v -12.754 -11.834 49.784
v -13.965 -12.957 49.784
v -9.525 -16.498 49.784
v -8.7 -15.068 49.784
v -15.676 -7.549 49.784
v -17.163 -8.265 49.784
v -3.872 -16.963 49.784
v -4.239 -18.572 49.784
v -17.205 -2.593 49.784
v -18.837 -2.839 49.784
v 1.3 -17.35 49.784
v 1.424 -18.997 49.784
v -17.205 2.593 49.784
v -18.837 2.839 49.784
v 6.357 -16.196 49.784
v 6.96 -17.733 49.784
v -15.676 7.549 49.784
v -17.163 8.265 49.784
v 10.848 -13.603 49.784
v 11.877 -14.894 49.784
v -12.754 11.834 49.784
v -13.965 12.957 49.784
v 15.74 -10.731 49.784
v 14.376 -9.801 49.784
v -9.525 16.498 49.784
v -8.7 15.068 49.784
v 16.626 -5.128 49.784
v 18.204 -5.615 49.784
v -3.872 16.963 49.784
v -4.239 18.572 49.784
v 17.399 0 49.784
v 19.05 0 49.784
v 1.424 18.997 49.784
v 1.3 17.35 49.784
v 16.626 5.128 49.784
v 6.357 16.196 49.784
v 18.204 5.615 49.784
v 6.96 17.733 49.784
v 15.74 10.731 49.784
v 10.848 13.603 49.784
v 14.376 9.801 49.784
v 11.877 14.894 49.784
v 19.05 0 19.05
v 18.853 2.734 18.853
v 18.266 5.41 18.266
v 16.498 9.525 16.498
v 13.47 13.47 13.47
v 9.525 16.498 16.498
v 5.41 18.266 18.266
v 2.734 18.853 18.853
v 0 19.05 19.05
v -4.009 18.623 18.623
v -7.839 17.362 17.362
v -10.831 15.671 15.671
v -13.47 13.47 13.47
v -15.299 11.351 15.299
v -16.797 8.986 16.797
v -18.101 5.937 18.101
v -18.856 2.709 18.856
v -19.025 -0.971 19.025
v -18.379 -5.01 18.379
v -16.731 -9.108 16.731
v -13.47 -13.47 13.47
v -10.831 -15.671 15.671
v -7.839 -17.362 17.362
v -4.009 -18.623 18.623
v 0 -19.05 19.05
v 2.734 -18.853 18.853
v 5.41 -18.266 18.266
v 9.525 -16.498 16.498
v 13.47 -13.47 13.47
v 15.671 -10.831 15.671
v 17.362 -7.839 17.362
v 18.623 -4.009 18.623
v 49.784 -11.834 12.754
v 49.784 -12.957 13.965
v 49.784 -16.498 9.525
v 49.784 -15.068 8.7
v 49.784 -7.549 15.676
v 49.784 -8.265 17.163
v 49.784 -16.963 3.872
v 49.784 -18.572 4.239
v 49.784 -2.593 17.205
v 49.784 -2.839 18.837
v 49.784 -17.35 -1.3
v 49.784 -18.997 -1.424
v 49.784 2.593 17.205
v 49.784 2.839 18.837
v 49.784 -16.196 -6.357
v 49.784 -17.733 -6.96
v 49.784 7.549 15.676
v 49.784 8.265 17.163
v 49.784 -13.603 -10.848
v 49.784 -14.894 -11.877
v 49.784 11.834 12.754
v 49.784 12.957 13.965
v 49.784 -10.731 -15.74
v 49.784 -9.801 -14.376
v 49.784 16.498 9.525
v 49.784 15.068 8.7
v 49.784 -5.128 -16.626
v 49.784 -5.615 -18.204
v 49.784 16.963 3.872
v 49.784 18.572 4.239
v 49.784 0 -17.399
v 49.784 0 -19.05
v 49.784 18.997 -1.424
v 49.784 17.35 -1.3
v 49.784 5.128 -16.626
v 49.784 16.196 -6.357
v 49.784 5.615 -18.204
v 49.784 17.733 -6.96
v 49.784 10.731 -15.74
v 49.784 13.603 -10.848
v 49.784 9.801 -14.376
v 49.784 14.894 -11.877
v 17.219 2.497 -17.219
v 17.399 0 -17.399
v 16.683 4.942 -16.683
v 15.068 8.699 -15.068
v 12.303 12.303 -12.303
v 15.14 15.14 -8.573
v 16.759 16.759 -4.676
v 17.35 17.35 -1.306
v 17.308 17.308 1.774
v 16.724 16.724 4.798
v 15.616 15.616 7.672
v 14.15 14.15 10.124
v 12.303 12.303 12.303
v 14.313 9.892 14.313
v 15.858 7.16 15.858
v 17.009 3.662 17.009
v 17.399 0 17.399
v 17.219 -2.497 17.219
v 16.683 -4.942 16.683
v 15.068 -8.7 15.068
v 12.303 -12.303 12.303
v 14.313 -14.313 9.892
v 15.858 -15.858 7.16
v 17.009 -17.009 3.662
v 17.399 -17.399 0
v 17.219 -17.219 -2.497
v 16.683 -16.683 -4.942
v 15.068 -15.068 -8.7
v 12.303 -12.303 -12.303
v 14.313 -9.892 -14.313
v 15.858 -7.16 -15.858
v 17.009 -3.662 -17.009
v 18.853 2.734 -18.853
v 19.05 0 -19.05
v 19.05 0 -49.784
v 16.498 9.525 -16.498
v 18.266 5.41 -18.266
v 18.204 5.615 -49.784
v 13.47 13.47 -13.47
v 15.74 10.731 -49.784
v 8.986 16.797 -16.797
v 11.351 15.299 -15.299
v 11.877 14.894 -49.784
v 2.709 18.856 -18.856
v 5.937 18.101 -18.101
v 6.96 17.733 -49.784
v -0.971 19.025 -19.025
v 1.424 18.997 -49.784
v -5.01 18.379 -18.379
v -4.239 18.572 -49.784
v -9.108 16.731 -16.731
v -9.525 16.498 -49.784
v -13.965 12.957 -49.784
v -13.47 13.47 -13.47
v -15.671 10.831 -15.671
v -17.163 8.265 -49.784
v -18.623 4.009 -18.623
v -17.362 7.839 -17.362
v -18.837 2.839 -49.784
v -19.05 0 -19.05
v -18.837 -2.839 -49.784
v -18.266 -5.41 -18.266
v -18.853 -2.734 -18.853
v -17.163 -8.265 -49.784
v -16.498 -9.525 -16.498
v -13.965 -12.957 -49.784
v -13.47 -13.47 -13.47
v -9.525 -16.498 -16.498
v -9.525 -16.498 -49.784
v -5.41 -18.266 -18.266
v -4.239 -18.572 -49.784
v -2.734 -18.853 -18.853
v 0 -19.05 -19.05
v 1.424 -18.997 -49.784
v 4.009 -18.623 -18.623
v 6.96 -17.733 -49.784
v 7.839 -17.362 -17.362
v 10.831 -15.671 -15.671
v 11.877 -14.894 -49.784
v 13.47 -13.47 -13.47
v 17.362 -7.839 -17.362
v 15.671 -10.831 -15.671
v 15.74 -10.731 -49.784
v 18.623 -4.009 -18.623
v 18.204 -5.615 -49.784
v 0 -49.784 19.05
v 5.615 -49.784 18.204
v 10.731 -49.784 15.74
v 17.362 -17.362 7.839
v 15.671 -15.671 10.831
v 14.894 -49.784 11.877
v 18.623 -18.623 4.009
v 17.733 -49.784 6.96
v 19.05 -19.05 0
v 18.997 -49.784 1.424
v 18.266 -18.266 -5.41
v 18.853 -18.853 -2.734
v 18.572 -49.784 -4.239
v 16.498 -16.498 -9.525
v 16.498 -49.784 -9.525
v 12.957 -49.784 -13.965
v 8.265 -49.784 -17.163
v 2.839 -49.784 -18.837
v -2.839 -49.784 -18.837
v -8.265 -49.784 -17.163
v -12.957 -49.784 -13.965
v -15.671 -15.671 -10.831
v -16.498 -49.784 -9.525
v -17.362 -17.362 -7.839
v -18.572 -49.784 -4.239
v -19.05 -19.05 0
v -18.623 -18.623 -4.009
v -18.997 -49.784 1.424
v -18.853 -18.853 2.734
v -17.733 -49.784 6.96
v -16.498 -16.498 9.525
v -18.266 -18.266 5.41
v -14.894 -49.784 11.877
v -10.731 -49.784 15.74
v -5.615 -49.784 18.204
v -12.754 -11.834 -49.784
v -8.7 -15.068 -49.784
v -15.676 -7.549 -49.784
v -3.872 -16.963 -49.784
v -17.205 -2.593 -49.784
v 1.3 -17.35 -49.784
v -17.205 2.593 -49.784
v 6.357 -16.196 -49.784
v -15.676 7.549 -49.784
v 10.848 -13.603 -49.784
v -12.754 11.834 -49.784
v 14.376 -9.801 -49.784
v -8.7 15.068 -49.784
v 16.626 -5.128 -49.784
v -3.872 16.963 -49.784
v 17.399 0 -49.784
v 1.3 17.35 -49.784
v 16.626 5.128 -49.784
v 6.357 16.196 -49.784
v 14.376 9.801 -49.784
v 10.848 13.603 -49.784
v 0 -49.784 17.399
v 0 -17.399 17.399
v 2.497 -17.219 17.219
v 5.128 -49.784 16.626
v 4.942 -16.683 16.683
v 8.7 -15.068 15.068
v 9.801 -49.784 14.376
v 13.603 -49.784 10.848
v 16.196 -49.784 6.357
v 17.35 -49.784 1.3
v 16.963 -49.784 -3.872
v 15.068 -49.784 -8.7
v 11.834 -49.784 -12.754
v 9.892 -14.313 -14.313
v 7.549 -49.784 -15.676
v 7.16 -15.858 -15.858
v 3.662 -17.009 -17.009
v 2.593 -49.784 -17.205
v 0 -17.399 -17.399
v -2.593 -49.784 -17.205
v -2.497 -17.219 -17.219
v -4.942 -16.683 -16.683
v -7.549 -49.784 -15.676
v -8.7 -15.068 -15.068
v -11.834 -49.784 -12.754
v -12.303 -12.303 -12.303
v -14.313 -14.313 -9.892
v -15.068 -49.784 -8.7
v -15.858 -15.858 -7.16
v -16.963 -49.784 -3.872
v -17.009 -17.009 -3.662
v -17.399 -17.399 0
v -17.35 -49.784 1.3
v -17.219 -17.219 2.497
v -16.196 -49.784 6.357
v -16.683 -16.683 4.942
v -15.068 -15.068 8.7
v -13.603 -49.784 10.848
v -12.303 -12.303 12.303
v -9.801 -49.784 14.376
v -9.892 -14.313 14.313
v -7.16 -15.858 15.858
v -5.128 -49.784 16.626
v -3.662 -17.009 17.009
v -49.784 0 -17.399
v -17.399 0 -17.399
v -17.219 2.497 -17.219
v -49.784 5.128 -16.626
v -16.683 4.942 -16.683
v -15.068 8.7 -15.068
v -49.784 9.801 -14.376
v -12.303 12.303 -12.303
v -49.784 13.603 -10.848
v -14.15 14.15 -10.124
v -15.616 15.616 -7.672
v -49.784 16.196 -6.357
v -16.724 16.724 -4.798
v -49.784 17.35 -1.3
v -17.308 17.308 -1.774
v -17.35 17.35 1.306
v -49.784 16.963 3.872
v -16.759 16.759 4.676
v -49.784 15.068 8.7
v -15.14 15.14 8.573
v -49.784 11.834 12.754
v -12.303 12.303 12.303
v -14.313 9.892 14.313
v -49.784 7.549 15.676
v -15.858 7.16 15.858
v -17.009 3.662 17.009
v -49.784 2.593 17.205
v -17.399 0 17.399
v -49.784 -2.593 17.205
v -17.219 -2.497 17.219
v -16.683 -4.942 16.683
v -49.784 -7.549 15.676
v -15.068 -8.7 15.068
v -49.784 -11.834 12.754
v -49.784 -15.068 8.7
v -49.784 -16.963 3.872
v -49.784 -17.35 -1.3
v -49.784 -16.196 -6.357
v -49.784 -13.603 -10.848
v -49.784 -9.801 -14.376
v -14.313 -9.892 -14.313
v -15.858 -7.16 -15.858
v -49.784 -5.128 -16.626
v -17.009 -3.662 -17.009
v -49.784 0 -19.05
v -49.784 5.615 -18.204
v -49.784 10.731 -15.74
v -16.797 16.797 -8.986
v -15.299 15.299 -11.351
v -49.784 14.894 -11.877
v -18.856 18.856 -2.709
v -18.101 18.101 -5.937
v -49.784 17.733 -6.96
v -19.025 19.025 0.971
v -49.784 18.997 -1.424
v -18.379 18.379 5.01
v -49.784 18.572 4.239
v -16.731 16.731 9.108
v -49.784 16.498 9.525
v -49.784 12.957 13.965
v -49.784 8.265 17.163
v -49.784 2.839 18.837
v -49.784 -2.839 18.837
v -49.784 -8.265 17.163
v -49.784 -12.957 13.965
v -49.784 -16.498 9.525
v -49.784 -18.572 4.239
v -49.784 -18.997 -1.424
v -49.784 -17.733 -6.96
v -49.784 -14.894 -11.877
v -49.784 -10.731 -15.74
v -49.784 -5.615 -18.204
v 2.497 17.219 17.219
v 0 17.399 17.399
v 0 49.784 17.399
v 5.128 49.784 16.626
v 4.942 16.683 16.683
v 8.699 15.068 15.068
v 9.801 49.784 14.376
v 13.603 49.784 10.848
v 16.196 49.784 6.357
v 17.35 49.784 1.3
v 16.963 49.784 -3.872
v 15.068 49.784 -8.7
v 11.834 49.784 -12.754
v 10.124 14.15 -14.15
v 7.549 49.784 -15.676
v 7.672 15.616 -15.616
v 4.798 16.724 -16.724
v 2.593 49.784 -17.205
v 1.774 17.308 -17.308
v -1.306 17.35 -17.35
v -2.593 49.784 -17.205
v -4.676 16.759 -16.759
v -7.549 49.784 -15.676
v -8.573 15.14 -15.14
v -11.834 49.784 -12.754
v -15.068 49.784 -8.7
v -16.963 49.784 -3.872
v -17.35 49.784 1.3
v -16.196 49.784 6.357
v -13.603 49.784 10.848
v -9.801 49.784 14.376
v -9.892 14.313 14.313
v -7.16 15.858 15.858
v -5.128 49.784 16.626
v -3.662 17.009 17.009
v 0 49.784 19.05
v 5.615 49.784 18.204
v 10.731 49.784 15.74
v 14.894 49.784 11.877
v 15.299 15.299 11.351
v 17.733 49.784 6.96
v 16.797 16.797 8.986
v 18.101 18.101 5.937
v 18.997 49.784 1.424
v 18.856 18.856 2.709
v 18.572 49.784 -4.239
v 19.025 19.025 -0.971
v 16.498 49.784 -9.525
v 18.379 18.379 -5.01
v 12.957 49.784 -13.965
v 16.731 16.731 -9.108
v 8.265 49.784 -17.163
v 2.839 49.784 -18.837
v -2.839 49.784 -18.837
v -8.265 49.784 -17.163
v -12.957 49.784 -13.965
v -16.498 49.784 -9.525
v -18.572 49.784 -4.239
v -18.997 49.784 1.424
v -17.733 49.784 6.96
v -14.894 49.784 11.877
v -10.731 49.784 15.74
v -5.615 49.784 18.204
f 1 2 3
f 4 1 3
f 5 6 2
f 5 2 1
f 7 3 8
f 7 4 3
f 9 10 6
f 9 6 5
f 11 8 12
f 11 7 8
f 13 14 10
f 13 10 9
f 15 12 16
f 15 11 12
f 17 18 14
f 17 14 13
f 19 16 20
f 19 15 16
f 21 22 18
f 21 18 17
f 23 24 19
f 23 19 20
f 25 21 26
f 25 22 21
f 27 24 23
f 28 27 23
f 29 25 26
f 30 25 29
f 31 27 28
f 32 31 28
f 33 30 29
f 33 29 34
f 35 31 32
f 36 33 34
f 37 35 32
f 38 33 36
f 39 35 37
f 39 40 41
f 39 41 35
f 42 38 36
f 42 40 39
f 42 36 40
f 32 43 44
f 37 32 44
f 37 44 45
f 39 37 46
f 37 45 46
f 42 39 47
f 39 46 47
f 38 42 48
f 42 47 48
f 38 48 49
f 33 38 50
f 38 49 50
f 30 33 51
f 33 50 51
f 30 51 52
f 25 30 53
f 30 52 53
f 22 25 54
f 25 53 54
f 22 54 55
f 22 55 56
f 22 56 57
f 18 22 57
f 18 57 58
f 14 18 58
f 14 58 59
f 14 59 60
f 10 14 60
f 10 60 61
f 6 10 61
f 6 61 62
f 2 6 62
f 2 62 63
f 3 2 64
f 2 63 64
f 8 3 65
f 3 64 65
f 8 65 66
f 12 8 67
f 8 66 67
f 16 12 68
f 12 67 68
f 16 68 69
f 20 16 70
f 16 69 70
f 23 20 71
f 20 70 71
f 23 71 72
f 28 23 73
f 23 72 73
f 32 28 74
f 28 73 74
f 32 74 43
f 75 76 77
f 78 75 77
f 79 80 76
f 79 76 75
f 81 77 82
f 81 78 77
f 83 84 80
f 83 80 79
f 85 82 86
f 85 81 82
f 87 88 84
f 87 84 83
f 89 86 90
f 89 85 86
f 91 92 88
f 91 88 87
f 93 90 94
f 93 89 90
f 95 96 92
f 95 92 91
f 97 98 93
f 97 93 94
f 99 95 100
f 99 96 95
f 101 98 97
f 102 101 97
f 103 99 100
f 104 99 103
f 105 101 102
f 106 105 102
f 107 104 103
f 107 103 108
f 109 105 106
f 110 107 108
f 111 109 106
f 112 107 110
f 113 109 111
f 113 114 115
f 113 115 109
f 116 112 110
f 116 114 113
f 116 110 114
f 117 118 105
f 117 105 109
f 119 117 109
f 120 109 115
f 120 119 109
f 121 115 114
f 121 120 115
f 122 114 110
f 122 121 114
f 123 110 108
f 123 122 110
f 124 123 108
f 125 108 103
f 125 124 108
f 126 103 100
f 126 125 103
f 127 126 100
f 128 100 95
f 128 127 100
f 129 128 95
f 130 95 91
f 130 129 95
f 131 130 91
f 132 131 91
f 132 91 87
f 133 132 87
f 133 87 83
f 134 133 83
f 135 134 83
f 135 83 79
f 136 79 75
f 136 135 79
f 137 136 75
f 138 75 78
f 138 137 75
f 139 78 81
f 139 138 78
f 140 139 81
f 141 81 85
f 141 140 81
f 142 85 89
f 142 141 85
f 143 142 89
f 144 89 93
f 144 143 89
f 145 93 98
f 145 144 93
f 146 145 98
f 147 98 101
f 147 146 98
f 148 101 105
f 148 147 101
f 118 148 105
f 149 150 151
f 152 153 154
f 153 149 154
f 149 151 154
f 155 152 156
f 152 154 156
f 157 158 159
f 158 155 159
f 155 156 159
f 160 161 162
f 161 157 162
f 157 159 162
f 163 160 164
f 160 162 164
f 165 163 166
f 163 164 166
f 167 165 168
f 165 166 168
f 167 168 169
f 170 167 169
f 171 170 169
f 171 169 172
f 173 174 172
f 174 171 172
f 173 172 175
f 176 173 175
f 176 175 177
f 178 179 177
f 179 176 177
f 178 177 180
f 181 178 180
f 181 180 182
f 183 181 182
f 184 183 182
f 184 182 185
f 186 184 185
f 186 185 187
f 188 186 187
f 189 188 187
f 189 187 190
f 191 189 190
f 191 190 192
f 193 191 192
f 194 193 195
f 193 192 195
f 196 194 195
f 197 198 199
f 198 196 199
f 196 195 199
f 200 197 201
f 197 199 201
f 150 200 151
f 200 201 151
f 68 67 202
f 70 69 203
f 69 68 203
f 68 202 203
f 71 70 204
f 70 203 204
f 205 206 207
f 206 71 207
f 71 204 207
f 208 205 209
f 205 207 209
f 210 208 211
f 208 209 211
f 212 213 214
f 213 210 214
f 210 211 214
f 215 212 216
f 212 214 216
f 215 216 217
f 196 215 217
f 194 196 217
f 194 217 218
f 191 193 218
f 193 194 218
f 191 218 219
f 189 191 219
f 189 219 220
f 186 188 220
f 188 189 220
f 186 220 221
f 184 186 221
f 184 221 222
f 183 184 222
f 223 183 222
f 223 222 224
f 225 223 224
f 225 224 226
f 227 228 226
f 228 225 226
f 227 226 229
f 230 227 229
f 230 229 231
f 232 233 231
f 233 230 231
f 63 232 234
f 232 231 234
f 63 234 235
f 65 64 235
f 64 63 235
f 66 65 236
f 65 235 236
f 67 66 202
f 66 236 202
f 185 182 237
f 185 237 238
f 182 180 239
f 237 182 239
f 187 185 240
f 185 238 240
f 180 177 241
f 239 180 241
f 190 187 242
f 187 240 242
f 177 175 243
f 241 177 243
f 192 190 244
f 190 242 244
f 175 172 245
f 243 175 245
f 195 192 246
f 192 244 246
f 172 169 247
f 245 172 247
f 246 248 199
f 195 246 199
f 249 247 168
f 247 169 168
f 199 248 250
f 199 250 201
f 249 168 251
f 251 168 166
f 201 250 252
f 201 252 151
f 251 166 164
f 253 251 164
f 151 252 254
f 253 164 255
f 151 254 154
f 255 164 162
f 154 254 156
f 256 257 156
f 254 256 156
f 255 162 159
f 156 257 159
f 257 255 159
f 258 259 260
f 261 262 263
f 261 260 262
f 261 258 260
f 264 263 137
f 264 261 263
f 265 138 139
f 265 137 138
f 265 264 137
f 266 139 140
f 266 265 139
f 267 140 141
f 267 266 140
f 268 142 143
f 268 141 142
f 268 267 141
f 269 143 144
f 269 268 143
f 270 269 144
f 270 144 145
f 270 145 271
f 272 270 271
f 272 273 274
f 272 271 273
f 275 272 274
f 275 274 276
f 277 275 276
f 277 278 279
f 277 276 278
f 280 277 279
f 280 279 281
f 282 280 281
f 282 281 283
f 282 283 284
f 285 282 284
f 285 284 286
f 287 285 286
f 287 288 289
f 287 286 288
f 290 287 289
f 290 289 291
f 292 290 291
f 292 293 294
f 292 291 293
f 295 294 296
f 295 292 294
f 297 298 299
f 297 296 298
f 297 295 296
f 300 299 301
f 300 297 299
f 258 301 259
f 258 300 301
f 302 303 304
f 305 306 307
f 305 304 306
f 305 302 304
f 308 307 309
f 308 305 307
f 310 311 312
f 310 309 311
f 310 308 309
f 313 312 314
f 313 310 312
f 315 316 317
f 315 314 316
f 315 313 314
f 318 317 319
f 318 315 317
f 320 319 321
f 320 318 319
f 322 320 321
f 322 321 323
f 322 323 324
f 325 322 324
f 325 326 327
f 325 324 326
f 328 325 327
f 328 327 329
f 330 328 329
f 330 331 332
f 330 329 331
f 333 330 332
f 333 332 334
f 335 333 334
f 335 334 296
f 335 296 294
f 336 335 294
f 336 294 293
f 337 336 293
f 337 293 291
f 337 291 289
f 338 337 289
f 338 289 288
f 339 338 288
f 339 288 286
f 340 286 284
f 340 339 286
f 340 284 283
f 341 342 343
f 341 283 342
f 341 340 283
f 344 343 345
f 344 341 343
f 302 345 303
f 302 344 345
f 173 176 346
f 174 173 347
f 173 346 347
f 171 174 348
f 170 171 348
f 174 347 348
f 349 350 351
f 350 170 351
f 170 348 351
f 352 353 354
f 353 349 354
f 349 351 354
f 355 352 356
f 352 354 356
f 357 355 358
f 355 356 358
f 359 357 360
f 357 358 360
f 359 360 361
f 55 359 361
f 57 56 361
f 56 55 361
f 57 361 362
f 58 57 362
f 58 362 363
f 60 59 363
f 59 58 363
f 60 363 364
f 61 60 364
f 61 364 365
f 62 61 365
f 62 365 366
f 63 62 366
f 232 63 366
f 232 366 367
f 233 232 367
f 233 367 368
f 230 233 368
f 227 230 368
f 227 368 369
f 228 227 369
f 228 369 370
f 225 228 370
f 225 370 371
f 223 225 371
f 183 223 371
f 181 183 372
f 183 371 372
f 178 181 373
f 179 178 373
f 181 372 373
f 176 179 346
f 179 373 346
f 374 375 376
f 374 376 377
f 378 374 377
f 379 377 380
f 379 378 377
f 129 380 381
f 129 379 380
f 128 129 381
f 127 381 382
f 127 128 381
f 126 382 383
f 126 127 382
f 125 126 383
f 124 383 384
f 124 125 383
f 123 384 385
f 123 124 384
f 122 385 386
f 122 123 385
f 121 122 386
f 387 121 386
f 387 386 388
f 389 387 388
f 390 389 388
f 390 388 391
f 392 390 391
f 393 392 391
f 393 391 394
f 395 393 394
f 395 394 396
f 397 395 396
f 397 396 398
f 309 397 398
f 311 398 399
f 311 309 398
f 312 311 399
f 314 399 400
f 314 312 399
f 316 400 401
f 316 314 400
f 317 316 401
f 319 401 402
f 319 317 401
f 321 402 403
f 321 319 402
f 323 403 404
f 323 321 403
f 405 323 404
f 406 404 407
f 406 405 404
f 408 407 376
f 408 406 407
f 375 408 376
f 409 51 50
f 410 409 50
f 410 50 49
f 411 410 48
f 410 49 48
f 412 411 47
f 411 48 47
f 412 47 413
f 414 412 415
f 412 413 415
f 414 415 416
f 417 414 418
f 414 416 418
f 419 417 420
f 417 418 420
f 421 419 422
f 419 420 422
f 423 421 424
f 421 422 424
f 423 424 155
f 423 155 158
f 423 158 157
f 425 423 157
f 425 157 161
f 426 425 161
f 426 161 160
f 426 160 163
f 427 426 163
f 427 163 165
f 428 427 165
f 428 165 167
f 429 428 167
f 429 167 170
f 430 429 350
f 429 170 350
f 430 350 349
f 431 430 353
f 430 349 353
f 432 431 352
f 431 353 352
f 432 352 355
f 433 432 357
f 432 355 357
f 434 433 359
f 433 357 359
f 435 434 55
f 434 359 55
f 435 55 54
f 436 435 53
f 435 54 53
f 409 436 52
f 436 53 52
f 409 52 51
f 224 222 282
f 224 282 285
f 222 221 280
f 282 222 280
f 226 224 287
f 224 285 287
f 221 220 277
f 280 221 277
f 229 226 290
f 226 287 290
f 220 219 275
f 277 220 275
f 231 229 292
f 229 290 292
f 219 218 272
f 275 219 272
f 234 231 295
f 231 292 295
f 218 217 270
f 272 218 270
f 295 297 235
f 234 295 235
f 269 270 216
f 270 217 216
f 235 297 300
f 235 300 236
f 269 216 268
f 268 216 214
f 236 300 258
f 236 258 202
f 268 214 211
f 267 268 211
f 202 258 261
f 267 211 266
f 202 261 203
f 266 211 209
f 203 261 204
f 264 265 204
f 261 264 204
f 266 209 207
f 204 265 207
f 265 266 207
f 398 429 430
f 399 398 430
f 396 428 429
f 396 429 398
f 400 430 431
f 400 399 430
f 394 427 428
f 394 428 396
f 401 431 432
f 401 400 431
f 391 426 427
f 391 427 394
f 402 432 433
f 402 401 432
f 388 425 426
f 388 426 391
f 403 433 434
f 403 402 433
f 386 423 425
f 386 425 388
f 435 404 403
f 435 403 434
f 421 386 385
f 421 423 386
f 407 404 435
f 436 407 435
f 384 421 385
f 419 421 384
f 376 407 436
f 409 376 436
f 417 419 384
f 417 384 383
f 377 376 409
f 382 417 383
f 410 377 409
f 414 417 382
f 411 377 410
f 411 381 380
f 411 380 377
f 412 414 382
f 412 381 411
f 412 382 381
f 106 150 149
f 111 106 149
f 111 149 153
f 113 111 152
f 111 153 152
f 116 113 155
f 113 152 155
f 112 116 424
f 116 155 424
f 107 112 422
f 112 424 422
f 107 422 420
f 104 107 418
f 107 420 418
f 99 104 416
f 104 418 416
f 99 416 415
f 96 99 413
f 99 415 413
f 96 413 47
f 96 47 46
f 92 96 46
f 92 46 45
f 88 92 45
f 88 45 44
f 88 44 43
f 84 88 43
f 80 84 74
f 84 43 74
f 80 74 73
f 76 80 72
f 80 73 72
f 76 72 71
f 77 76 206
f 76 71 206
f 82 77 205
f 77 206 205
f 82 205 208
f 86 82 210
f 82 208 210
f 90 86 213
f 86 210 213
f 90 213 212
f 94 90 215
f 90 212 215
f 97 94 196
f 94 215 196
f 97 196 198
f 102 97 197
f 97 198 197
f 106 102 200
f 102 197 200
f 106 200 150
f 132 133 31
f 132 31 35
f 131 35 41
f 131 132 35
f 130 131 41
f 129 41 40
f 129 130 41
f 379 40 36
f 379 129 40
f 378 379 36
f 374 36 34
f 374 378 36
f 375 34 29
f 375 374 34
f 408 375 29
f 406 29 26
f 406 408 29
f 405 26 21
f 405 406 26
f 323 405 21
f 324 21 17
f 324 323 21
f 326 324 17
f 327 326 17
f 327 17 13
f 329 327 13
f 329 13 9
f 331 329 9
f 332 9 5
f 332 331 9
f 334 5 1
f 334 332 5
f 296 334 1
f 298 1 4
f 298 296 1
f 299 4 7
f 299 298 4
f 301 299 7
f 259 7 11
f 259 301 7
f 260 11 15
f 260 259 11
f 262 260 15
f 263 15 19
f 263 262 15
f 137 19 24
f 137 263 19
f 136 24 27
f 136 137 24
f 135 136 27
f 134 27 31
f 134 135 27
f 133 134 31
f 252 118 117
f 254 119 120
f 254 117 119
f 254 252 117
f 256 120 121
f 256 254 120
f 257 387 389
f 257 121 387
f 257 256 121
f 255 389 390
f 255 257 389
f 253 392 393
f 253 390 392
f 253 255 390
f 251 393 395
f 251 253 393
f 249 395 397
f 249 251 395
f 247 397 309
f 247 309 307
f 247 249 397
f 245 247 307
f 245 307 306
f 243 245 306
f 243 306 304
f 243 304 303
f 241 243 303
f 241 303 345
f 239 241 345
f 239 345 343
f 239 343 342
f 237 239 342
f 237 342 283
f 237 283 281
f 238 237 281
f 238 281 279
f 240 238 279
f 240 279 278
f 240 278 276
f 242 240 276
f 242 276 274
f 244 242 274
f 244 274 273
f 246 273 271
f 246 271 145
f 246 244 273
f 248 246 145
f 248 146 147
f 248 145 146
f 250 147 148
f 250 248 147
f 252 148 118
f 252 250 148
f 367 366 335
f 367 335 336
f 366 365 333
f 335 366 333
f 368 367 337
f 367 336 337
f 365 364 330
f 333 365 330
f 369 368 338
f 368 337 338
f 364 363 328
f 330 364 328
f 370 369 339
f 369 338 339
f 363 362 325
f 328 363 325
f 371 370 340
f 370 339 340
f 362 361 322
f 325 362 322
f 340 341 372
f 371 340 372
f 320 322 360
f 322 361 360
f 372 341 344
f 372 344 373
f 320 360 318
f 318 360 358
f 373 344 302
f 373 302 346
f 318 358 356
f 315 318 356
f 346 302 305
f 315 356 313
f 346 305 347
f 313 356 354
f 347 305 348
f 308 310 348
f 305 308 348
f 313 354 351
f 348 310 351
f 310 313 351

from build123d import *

# Parameters (mm, degrees)
EXTRUDE1_DEPTH          = 49.784
EXTRUDE1_DEPTH_BACK     = 49.784
SKETCH1_R               = 19.05
EXTRUDE2_DEPTH          = 49.784
EXTRUDE2_DEPTH_BACK     = 49.784
SKETCH2_R               = 19.05
EXTRUDE3_DEPTH          = 49.784
EXTRUDE3_DEPTH_BACK     = 49.784
SKETCH3_R               = 19.05
CUT_EXTRUDE1_DEPTH      = 87.228417404
CUT_EXTRUDE1_DEPTH_BACK = 87.228417404
SKETCH4_R               = 17.399
CUT_EXTRUDE2_DEPTH      = 87.228417404
CUT_EXTRUDE2_DEPTH_BACK = 87.228417404
SKETCH5_R               = 17.399
CUT_EXTRUDE3_DEPTH      = 87.228417404
CUT_EXTRUDE3_DEPTH_BACK = 87.228417404
SKETCH6_R               = 17.399


with BuildPart() as part:
    # Sketch1 → Extrude1 (new, two sides: drawn at the far end of the back side and taken through both)
    with BuildSketch(Plane(origin=(0, 0, 0), x_dir=(1, 0, 0), z_dir=(0, 1, 0)).offset(-EXTRUDE1_DEPTH_BACK)):
        with Locations(Location((0, 0, 0), (0, 0, 270))):
            Circle(SKETCH1_R)
    extrude(amount=EXTRUDE1_DEPTH + EXTRUDE1_DEPTH_BACK)

    # Sketch2 → Extrude2 (add, two sides: drawn at the far end of the back side and taken through both)
    with BuildSketch(Plane.XY.offset(-EXTRUDE2_DEPTH_BACK)):
        Circle(SKETCH2_R)
    extrude(amount=EXTRUDE2_DEPTH + EXTRUDE2_DEPTH_BACK)

    # Sketch3 → Extrude3 (add, two sides: drawn at the far end of the back side and taken through both)
    with BuildSketch(Plane(origin=(0, 0, 0), x_dir=(0, 0, -1), z_dir=(1, 0, 0)).offset(-EXTRUDE3_DEPTH_BACK)):
        Circle(SKETCH3_R)
    extrude(amount=EXTRUDE3_DEPTH + EXTRUDE3_DEPTH_BACK)

    # Sketch4 → Cut-Extrude1 (cut, two sides: drawn at the far end of the back side and taken through both)
    with BuildSketch(Plane(origin=(0, 0, 0), x_dir=(1, 0, 0), z_dir=(0, 1, 0)).offset(-CUT_EXTRUDE1_DEPTH_BACK)):
        with Locations(Location((0, 0, 0), (0, 0, 270))):
            Circle(SKETCH4_R)
    extrude(amount=CUT_EXTRUDE1_DEPTH + CUT_EXTRUDE1_DEPTH_BACK, mode=Mode.SUBTRACT)

    # Sketch5 → Cut-Extrude2 (cut, two sides: drawn at the far end of the back side and taken through both)
    with BuildSketch(Plane(origin=(0, 0, 0), x_dir=(0, 0, -1), z_dir=(1, 0, 0)).offset(-CUT_EXTRUDE2_DEPTH_BACK)):
        Circle(SKETCH5_R)
    extrude(amount=CUT_EXTRUDE2_DEPTH + CUT_EXTRUDE2_DEPTH_BACK, mode=Mode.SUBTRACT)

    # Sketch6 → Cut-Extrude3 (cut, two sides: drawn at the far end of the back side and taken through both)
    with BuildSketch(Plane.XY.offset(-CUT_EXTRUDE3_DEPTH_BACK)):
        Circle(SKETCH6_R)
    extrude(amount=CUT_EXTRUDE3_DEPTH + CUT_EXTRUDE3_DEPTH_BACK, mode=Mode.SUBTRACT)


solid = part.part
